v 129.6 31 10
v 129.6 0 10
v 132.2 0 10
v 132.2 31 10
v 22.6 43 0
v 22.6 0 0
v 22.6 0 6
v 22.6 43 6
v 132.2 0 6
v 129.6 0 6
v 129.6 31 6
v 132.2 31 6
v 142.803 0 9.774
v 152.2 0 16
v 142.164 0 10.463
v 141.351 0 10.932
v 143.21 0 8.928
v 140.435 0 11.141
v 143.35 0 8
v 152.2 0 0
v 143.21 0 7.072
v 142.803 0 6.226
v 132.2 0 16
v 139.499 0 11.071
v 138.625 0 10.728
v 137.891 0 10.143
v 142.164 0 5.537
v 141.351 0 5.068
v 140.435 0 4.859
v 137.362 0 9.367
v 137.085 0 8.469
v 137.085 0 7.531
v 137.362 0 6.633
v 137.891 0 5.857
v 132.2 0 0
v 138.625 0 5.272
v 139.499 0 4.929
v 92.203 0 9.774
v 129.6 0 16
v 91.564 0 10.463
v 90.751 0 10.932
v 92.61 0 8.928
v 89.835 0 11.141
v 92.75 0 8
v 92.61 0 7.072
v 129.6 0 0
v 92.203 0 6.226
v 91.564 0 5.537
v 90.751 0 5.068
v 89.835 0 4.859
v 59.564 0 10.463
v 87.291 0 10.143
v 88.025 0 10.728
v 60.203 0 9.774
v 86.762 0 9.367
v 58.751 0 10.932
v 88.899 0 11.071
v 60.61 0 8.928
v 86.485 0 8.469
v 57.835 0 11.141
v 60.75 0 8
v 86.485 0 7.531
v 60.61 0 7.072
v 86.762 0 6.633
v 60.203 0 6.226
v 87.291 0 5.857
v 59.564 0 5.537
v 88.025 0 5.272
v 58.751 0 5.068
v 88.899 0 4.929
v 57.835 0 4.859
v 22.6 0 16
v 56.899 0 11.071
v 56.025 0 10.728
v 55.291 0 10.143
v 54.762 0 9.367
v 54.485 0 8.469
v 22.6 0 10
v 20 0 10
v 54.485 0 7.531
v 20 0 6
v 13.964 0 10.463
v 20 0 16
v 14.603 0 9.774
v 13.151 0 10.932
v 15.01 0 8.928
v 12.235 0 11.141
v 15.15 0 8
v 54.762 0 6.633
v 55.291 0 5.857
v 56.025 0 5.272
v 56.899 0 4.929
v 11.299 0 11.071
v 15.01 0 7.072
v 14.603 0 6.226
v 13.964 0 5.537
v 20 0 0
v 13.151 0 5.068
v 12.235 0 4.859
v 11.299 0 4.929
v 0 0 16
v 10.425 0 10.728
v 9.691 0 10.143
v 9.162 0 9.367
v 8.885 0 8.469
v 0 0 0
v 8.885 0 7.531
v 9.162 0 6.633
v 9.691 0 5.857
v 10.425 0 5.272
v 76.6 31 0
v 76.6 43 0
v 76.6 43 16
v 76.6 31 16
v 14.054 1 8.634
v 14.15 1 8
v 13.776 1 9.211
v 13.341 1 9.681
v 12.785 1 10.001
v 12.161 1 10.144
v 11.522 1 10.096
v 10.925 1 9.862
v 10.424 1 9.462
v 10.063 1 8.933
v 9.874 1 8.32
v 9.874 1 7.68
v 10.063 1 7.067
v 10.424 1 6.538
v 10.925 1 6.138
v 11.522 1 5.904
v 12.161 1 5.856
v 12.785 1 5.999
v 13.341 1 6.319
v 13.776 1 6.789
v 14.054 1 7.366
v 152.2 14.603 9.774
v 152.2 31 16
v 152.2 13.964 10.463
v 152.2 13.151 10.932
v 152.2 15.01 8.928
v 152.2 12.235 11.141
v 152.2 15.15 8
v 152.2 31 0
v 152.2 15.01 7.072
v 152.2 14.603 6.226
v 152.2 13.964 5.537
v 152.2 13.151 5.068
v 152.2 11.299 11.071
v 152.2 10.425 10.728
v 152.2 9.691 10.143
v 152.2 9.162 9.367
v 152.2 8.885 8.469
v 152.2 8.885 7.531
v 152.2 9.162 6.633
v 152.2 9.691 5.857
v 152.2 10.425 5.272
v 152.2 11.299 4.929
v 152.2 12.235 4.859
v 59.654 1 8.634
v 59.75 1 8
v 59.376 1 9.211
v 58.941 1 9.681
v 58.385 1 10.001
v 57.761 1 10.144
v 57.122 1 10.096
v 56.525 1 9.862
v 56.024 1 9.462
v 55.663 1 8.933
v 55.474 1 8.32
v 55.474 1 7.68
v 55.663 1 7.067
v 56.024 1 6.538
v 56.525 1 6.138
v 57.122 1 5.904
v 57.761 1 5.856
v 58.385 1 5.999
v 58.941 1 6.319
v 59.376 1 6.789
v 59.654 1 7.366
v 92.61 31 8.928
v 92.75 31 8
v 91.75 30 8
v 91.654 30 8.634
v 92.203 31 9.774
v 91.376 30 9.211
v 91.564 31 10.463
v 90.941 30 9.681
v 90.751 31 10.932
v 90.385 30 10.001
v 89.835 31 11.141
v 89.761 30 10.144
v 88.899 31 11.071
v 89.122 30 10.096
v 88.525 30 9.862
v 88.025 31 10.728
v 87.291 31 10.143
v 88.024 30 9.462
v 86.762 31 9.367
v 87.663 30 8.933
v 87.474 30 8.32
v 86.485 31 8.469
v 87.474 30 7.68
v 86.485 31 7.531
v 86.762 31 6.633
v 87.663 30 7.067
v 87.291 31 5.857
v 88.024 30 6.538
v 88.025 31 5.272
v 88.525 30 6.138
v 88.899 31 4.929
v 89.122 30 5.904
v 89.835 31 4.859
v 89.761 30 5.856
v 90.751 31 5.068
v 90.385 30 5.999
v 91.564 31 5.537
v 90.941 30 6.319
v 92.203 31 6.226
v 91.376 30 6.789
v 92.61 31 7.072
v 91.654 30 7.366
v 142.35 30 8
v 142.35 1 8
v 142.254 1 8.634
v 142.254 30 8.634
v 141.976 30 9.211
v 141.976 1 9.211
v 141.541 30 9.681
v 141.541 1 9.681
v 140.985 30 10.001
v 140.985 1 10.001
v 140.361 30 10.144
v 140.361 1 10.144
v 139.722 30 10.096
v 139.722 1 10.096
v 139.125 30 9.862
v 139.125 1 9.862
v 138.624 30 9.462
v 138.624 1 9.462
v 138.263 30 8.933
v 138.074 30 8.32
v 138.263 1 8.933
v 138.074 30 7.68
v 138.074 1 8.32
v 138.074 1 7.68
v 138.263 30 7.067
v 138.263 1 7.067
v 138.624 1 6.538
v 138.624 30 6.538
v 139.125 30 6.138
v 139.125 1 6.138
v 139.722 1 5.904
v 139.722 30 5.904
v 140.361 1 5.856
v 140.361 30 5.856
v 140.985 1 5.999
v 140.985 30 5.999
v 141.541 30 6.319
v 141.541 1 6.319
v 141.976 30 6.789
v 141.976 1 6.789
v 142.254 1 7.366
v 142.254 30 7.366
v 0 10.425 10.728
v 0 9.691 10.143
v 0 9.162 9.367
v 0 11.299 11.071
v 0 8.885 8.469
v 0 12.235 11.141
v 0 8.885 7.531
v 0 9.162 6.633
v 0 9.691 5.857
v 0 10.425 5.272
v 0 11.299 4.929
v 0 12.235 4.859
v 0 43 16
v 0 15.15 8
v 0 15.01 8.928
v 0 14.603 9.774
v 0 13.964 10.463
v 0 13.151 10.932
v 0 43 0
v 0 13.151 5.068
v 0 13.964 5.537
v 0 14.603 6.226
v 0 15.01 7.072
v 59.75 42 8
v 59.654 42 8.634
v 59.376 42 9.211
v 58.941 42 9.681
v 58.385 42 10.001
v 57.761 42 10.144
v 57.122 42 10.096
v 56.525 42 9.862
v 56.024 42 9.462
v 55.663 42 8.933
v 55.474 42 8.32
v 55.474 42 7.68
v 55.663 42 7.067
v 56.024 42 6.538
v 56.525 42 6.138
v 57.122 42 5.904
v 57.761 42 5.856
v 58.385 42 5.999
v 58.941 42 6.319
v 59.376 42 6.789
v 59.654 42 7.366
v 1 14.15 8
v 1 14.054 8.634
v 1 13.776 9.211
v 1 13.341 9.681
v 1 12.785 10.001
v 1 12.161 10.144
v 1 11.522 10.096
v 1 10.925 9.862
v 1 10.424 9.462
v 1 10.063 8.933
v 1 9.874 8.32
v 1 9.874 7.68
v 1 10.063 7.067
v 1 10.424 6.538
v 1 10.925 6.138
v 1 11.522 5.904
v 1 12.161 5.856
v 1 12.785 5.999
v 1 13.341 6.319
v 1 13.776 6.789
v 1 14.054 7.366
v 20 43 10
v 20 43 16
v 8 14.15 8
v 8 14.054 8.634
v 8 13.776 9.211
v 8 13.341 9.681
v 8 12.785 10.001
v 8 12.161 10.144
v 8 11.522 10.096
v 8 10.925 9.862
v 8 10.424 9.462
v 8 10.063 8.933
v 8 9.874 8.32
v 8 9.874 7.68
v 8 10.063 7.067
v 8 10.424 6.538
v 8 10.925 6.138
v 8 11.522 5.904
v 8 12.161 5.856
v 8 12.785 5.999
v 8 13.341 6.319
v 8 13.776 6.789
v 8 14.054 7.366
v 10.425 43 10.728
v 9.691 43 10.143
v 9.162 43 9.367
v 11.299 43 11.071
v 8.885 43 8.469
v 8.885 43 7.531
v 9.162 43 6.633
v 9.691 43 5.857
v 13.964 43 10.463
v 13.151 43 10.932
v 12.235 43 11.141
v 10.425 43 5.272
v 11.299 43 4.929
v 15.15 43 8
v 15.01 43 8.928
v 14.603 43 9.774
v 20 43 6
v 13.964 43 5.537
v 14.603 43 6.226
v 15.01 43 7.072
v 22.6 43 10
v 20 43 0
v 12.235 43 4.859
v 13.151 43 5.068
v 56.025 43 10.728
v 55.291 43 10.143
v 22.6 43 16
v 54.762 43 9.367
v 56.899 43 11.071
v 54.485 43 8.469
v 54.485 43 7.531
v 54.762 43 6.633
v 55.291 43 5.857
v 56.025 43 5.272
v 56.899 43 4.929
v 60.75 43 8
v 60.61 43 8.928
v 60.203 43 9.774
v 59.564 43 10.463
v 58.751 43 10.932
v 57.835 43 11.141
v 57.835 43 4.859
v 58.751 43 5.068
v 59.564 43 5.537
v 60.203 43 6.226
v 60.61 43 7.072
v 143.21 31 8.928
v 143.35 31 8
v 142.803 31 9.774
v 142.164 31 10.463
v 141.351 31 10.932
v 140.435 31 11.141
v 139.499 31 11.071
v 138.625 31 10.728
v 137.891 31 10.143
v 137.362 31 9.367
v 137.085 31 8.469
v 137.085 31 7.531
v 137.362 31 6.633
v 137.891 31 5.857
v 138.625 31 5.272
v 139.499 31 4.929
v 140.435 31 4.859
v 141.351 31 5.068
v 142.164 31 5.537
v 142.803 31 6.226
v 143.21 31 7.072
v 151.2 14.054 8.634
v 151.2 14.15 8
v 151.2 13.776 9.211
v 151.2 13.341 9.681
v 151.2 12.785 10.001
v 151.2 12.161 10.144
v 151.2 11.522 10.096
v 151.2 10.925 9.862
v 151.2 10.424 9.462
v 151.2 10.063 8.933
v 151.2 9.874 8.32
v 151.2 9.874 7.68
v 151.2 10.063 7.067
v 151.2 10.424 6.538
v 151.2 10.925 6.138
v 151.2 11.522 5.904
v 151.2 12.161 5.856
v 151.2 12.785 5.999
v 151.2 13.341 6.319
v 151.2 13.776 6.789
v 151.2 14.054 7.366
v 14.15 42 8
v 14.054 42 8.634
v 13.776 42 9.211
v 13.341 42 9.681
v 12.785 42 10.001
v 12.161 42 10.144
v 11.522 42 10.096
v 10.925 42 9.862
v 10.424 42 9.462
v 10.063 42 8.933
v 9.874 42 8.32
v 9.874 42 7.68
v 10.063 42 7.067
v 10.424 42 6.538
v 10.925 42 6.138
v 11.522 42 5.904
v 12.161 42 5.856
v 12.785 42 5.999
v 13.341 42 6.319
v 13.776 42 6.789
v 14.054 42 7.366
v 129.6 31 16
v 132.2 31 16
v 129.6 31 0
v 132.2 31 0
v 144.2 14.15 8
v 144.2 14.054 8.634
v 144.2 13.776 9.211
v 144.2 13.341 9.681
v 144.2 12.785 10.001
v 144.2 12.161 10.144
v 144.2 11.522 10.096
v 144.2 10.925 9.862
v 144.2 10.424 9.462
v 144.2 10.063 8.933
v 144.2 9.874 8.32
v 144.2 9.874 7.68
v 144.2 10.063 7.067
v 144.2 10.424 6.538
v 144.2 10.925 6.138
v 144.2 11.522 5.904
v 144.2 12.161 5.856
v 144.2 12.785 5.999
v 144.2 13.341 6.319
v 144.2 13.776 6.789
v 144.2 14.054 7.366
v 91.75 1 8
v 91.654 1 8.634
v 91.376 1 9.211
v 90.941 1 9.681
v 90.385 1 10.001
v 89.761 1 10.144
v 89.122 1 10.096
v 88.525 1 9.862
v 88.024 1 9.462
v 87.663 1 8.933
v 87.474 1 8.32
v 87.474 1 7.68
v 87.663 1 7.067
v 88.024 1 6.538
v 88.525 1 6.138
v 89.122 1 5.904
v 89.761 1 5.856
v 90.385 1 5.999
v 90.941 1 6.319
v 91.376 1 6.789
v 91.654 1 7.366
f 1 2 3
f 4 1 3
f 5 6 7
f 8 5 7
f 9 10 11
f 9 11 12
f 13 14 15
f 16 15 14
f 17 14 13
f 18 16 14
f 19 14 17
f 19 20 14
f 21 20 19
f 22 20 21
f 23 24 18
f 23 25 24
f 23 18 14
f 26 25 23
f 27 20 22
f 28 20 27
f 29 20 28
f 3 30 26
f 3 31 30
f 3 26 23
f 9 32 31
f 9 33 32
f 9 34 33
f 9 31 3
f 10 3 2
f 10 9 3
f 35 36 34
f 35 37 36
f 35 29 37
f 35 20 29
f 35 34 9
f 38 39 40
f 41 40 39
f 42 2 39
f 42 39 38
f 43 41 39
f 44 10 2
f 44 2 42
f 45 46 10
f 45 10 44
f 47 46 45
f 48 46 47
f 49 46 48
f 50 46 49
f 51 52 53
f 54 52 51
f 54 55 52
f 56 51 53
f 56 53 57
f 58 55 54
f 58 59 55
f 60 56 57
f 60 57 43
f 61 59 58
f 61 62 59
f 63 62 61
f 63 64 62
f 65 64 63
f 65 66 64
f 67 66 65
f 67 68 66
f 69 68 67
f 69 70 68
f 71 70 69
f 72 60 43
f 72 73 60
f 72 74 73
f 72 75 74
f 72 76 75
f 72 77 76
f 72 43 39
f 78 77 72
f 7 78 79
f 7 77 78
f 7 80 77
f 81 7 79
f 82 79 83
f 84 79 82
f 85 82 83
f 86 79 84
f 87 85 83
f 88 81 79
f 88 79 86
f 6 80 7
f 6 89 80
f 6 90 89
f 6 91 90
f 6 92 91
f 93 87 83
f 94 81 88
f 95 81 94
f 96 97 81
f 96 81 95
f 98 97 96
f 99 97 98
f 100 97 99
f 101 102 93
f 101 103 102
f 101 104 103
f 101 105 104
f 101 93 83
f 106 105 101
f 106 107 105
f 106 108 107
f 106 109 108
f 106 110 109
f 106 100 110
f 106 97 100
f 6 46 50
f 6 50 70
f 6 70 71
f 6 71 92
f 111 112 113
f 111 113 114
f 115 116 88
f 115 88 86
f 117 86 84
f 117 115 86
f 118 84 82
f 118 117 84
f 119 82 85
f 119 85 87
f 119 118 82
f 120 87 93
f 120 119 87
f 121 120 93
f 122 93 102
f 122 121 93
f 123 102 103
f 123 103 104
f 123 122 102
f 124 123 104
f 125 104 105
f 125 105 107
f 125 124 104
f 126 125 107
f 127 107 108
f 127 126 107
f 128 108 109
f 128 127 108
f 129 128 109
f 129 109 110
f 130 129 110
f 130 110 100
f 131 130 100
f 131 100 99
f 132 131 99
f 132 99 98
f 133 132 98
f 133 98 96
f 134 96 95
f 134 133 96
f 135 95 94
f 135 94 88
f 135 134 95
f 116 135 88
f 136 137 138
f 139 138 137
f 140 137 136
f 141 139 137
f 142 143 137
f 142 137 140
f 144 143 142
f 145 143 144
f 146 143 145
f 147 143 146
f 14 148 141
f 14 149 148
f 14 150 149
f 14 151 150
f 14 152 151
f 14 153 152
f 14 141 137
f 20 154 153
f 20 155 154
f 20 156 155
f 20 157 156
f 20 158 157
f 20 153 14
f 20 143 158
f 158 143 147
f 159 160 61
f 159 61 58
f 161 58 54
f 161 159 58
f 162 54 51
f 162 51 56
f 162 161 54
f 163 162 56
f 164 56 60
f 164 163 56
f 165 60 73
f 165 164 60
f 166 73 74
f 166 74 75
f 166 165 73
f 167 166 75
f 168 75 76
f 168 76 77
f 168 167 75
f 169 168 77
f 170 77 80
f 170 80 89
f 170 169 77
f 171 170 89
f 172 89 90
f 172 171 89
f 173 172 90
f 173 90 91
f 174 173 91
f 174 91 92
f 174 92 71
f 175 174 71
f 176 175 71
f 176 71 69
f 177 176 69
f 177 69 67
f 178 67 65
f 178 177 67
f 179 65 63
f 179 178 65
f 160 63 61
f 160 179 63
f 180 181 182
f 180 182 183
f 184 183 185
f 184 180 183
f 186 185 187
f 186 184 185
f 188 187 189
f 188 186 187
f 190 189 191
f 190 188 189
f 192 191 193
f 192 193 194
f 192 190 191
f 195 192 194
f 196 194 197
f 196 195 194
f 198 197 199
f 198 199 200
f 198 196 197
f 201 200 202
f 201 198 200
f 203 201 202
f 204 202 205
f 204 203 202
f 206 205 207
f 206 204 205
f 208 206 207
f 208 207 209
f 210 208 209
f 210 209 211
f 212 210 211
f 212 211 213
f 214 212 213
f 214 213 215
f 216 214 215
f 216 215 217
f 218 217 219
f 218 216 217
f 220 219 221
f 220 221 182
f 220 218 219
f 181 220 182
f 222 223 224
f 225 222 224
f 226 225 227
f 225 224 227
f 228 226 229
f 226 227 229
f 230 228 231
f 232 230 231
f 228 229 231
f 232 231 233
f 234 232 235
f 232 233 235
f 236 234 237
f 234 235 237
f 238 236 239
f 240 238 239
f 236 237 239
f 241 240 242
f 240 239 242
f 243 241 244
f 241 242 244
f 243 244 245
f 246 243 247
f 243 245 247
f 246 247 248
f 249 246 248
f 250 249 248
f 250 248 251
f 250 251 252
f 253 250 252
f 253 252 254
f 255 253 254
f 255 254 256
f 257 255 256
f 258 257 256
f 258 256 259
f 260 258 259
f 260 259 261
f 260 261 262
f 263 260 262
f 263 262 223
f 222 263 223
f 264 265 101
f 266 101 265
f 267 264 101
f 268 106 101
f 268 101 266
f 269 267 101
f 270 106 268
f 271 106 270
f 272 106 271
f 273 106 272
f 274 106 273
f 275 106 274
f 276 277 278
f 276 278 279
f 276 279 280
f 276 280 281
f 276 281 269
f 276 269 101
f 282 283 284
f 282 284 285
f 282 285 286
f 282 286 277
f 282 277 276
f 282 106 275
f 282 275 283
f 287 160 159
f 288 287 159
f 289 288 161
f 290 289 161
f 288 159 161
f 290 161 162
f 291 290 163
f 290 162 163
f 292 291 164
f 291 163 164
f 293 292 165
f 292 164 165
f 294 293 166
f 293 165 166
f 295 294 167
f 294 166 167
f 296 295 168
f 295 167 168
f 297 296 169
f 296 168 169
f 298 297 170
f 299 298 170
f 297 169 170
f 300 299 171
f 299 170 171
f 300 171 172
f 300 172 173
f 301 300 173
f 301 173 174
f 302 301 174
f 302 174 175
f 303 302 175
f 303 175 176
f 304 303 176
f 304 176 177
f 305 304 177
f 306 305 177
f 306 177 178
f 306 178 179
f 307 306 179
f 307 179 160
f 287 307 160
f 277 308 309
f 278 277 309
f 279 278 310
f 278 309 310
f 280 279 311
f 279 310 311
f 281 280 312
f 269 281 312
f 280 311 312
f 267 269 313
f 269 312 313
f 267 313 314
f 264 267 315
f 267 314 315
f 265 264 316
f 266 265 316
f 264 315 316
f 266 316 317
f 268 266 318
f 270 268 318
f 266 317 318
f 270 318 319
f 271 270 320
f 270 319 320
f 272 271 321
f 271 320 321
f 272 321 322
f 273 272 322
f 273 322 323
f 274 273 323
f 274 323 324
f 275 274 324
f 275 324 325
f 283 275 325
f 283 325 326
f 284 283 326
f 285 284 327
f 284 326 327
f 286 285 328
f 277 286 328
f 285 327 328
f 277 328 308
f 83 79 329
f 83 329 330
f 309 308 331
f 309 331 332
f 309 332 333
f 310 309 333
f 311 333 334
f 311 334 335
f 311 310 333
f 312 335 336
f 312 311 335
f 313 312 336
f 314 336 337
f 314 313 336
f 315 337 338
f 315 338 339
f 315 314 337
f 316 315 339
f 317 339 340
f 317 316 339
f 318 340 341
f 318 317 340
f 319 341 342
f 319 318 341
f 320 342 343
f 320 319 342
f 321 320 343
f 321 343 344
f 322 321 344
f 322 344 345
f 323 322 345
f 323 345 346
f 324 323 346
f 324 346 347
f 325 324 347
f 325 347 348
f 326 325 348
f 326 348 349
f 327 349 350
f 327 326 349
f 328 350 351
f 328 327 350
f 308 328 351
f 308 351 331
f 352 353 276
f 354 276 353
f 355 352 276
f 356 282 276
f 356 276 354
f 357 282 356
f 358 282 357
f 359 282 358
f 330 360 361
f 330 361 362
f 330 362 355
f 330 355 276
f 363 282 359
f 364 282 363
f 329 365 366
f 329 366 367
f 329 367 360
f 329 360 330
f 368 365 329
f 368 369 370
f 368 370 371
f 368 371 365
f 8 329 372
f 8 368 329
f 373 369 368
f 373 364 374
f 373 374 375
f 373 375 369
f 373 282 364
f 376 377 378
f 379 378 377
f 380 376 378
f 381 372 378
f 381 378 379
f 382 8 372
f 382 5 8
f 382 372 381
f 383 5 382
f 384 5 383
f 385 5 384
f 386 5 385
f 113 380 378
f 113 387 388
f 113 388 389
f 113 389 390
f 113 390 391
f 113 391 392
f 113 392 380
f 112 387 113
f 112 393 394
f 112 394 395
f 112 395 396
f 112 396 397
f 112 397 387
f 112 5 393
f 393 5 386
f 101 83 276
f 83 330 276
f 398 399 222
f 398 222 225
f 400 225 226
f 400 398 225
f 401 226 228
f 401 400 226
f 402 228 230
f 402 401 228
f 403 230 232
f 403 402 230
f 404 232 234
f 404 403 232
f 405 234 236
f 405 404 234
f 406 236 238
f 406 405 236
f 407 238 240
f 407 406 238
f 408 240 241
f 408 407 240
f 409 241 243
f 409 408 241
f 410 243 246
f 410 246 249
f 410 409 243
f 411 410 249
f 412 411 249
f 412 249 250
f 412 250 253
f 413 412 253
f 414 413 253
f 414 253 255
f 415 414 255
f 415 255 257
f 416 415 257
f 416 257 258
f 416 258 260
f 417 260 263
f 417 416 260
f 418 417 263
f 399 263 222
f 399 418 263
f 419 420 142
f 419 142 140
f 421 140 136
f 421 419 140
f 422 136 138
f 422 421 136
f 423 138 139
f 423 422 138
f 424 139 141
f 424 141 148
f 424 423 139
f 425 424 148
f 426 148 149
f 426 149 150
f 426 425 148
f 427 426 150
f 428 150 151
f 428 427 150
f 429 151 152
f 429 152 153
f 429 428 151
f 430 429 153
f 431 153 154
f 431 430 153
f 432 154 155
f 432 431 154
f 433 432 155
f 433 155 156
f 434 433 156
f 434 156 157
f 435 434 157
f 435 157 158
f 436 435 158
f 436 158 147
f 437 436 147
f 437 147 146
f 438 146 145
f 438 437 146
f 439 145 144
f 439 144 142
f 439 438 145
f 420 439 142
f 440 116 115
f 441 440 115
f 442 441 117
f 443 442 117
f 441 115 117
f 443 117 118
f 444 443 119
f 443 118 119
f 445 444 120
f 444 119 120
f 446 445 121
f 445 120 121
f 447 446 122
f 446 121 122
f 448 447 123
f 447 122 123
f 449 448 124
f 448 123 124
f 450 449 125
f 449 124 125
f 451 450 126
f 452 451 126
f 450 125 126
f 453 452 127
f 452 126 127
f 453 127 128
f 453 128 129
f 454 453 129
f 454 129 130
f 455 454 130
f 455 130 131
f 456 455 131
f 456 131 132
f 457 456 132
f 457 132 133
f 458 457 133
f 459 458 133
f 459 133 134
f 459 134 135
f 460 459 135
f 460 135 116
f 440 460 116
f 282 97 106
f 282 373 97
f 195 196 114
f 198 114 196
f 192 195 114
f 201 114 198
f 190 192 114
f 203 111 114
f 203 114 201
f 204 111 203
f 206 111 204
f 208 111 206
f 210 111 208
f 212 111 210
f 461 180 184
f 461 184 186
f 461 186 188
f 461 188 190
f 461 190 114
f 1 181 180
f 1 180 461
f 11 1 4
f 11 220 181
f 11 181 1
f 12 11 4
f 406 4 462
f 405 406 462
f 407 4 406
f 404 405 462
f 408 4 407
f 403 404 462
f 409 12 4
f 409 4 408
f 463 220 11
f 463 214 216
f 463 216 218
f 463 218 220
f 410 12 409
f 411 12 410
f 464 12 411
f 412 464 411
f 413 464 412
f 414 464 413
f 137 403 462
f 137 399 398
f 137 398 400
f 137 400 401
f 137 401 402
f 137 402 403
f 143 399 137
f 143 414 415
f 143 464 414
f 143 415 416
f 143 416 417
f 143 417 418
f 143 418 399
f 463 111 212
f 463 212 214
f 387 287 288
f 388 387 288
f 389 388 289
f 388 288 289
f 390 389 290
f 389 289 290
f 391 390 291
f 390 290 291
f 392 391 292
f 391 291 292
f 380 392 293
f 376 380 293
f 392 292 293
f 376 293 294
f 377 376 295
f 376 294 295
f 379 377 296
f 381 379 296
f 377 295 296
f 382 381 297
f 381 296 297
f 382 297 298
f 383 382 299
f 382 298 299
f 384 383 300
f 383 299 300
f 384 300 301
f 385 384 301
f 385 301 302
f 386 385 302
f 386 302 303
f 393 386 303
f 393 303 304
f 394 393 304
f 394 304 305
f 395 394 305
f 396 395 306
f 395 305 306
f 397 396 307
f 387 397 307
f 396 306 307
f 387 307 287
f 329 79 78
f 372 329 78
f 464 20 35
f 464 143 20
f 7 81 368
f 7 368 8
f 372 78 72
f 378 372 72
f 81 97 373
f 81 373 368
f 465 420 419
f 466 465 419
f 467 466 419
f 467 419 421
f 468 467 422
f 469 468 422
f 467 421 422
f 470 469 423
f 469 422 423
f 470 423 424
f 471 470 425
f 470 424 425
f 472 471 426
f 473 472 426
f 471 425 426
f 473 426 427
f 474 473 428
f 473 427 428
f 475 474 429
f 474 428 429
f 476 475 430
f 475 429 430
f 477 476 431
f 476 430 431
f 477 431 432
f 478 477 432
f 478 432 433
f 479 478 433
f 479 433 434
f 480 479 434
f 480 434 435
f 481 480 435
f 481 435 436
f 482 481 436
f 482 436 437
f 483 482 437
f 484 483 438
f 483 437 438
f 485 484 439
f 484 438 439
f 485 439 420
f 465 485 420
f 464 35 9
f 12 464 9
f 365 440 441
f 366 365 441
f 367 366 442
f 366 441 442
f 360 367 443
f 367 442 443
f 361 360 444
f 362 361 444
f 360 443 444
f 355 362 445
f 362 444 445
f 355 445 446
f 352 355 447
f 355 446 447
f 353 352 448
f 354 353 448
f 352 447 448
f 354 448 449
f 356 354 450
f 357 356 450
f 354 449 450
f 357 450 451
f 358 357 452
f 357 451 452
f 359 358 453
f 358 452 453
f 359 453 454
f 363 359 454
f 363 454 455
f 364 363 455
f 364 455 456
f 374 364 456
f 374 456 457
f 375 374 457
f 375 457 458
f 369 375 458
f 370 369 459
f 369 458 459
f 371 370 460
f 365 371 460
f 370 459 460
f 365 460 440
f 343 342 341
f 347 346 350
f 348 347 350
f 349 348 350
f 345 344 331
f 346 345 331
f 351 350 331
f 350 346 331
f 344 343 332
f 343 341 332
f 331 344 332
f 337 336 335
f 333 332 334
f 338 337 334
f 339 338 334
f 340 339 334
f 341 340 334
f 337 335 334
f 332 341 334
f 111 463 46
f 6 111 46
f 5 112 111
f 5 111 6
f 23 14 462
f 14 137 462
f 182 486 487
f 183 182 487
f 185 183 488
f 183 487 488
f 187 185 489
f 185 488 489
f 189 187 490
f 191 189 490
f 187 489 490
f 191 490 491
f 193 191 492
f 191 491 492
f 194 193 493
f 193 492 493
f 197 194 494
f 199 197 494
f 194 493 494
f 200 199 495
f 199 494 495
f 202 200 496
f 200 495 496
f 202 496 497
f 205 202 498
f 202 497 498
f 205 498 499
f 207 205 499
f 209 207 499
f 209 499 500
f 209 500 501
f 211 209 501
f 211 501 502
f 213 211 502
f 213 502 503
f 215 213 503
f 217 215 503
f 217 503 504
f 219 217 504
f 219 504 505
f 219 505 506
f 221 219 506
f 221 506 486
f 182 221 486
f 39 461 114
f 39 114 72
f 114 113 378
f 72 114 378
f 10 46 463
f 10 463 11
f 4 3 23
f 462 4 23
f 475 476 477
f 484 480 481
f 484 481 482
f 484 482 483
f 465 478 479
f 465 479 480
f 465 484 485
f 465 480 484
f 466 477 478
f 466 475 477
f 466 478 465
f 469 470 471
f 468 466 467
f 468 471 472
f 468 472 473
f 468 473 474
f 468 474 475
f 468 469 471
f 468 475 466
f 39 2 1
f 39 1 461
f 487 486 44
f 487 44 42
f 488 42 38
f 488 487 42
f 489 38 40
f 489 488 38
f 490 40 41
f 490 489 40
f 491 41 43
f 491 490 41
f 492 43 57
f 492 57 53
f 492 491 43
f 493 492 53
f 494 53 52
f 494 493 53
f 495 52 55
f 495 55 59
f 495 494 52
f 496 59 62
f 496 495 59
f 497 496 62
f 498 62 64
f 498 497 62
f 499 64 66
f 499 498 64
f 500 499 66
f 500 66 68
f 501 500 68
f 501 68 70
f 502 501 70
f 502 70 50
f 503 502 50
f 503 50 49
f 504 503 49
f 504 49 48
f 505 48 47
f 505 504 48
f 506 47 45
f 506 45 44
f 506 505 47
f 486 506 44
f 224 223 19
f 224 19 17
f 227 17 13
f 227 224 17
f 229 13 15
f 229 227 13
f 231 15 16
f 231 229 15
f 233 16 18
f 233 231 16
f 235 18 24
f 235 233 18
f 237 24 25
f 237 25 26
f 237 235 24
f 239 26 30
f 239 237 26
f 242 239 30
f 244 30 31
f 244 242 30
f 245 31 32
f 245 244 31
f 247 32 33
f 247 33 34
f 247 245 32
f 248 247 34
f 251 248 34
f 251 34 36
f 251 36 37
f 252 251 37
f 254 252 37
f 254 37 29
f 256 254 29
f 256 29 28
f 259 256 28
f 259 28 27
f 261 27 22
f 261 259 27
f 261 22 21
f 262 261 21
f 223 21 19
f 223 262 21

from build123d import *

# Parameters (mm, degrees)
PAD_DEPTH       = 16
SKETCH001_R     = 2.15
SKETCH001_W     = 2.6
SKETCH001_H     = 6
POCKET_DEPTH    = 43.001
CHAMFER_SIZE    = 1
SKETCH002_R     = 2.15
POCKET001_DEPTH = 8
SKETCH003_R     = 2.15
POCKET002_DEPTH = 8
CHAMFER001_SIZE = 1


with BuildPart() as part:
    # Sketch → Pad (new body)
    with BuildSketch(Plane.XY):
        Polygon((0, 0), (0, 43), (76.6, 43), (76.6, 31), (152.2, 31), (152.2, 0), align=None)
    extrude(amount=PAD_DEPTH)

    # Sketch001 → Pocket (cut, through all)
    with BuildSketch(Plane.XZ):
        with Locations((12, 8)):
            Circle(SKETCH001_R)
        with Locations((89.6, 8)):
            Circle(SKETCH001_R)
        with Locations((140.2, 8)):
            Circle(SKETCH001_R)
        with Locations((57.6, 8)):
            Circle(SKETCH001_R)
        with Locations((21.3, 3)):
            Rectangle(SKETCH001_W, SKETCH001_H)
        with Locations((21.3, 13)):
            Rectangle(SKETCH001_W, SKETCH001_H)
        with Locations((130.9, 13)):
            Rectangle(SKETCH001_W, SKETCH001_H)
        with Locations((130.9, 3)):
            Rectangle(SKETCH001_W, SKETCH001_H)
    extrude(amount=-POCKET_DEPTH, mode=Mode.SUBTRACT)

    # Chamfer
    chamfer_edges = [part.edges().sort_by_distance(p)[0] for p in [
        (9.85, 0, 8),
        (55.45, 0, 8),
        (87.45, 0, 8),
        (138.05, 0, 8),
        (9.85, 43, 8),
        (55.45, 43, 8),
        (87.45, 31, 8),
        (138.05, 31, 8),
    ]]
    chamfer(chamfer_edges, length=CHAMFER_SIZE)

    # Sketch002 → Pocket001 (cut)
    with BuildSketch(Plane.YZ):
        with Locations((12, 8)):
            Circle(SKETCH002_R)
    extrude(amount=POCKET001_DEPTH, mode=Mode.SUBTRACT)

    # Sketch003 (on DatumPlane) → Pocket002 (cut)
    with BuildSketch(Plane.YZ.offset(152.2)):
        with Locations((12, 8)):
            Circle(SKETCH003_R)
    extrude(amount=-POCKET002_DEPTH, mode=Mode.SUBTRACT)

    # Chamfer001
    chamfer001_edges = [part.edges().sort_by_distance(p)[0] for p in [
        (152.2, 9.85, 8),
        (0, 9.85, 8),
    ]]
    chamfer(chamfer001_edges, length=CHAMFER001_SIZE)


solid = part.part
